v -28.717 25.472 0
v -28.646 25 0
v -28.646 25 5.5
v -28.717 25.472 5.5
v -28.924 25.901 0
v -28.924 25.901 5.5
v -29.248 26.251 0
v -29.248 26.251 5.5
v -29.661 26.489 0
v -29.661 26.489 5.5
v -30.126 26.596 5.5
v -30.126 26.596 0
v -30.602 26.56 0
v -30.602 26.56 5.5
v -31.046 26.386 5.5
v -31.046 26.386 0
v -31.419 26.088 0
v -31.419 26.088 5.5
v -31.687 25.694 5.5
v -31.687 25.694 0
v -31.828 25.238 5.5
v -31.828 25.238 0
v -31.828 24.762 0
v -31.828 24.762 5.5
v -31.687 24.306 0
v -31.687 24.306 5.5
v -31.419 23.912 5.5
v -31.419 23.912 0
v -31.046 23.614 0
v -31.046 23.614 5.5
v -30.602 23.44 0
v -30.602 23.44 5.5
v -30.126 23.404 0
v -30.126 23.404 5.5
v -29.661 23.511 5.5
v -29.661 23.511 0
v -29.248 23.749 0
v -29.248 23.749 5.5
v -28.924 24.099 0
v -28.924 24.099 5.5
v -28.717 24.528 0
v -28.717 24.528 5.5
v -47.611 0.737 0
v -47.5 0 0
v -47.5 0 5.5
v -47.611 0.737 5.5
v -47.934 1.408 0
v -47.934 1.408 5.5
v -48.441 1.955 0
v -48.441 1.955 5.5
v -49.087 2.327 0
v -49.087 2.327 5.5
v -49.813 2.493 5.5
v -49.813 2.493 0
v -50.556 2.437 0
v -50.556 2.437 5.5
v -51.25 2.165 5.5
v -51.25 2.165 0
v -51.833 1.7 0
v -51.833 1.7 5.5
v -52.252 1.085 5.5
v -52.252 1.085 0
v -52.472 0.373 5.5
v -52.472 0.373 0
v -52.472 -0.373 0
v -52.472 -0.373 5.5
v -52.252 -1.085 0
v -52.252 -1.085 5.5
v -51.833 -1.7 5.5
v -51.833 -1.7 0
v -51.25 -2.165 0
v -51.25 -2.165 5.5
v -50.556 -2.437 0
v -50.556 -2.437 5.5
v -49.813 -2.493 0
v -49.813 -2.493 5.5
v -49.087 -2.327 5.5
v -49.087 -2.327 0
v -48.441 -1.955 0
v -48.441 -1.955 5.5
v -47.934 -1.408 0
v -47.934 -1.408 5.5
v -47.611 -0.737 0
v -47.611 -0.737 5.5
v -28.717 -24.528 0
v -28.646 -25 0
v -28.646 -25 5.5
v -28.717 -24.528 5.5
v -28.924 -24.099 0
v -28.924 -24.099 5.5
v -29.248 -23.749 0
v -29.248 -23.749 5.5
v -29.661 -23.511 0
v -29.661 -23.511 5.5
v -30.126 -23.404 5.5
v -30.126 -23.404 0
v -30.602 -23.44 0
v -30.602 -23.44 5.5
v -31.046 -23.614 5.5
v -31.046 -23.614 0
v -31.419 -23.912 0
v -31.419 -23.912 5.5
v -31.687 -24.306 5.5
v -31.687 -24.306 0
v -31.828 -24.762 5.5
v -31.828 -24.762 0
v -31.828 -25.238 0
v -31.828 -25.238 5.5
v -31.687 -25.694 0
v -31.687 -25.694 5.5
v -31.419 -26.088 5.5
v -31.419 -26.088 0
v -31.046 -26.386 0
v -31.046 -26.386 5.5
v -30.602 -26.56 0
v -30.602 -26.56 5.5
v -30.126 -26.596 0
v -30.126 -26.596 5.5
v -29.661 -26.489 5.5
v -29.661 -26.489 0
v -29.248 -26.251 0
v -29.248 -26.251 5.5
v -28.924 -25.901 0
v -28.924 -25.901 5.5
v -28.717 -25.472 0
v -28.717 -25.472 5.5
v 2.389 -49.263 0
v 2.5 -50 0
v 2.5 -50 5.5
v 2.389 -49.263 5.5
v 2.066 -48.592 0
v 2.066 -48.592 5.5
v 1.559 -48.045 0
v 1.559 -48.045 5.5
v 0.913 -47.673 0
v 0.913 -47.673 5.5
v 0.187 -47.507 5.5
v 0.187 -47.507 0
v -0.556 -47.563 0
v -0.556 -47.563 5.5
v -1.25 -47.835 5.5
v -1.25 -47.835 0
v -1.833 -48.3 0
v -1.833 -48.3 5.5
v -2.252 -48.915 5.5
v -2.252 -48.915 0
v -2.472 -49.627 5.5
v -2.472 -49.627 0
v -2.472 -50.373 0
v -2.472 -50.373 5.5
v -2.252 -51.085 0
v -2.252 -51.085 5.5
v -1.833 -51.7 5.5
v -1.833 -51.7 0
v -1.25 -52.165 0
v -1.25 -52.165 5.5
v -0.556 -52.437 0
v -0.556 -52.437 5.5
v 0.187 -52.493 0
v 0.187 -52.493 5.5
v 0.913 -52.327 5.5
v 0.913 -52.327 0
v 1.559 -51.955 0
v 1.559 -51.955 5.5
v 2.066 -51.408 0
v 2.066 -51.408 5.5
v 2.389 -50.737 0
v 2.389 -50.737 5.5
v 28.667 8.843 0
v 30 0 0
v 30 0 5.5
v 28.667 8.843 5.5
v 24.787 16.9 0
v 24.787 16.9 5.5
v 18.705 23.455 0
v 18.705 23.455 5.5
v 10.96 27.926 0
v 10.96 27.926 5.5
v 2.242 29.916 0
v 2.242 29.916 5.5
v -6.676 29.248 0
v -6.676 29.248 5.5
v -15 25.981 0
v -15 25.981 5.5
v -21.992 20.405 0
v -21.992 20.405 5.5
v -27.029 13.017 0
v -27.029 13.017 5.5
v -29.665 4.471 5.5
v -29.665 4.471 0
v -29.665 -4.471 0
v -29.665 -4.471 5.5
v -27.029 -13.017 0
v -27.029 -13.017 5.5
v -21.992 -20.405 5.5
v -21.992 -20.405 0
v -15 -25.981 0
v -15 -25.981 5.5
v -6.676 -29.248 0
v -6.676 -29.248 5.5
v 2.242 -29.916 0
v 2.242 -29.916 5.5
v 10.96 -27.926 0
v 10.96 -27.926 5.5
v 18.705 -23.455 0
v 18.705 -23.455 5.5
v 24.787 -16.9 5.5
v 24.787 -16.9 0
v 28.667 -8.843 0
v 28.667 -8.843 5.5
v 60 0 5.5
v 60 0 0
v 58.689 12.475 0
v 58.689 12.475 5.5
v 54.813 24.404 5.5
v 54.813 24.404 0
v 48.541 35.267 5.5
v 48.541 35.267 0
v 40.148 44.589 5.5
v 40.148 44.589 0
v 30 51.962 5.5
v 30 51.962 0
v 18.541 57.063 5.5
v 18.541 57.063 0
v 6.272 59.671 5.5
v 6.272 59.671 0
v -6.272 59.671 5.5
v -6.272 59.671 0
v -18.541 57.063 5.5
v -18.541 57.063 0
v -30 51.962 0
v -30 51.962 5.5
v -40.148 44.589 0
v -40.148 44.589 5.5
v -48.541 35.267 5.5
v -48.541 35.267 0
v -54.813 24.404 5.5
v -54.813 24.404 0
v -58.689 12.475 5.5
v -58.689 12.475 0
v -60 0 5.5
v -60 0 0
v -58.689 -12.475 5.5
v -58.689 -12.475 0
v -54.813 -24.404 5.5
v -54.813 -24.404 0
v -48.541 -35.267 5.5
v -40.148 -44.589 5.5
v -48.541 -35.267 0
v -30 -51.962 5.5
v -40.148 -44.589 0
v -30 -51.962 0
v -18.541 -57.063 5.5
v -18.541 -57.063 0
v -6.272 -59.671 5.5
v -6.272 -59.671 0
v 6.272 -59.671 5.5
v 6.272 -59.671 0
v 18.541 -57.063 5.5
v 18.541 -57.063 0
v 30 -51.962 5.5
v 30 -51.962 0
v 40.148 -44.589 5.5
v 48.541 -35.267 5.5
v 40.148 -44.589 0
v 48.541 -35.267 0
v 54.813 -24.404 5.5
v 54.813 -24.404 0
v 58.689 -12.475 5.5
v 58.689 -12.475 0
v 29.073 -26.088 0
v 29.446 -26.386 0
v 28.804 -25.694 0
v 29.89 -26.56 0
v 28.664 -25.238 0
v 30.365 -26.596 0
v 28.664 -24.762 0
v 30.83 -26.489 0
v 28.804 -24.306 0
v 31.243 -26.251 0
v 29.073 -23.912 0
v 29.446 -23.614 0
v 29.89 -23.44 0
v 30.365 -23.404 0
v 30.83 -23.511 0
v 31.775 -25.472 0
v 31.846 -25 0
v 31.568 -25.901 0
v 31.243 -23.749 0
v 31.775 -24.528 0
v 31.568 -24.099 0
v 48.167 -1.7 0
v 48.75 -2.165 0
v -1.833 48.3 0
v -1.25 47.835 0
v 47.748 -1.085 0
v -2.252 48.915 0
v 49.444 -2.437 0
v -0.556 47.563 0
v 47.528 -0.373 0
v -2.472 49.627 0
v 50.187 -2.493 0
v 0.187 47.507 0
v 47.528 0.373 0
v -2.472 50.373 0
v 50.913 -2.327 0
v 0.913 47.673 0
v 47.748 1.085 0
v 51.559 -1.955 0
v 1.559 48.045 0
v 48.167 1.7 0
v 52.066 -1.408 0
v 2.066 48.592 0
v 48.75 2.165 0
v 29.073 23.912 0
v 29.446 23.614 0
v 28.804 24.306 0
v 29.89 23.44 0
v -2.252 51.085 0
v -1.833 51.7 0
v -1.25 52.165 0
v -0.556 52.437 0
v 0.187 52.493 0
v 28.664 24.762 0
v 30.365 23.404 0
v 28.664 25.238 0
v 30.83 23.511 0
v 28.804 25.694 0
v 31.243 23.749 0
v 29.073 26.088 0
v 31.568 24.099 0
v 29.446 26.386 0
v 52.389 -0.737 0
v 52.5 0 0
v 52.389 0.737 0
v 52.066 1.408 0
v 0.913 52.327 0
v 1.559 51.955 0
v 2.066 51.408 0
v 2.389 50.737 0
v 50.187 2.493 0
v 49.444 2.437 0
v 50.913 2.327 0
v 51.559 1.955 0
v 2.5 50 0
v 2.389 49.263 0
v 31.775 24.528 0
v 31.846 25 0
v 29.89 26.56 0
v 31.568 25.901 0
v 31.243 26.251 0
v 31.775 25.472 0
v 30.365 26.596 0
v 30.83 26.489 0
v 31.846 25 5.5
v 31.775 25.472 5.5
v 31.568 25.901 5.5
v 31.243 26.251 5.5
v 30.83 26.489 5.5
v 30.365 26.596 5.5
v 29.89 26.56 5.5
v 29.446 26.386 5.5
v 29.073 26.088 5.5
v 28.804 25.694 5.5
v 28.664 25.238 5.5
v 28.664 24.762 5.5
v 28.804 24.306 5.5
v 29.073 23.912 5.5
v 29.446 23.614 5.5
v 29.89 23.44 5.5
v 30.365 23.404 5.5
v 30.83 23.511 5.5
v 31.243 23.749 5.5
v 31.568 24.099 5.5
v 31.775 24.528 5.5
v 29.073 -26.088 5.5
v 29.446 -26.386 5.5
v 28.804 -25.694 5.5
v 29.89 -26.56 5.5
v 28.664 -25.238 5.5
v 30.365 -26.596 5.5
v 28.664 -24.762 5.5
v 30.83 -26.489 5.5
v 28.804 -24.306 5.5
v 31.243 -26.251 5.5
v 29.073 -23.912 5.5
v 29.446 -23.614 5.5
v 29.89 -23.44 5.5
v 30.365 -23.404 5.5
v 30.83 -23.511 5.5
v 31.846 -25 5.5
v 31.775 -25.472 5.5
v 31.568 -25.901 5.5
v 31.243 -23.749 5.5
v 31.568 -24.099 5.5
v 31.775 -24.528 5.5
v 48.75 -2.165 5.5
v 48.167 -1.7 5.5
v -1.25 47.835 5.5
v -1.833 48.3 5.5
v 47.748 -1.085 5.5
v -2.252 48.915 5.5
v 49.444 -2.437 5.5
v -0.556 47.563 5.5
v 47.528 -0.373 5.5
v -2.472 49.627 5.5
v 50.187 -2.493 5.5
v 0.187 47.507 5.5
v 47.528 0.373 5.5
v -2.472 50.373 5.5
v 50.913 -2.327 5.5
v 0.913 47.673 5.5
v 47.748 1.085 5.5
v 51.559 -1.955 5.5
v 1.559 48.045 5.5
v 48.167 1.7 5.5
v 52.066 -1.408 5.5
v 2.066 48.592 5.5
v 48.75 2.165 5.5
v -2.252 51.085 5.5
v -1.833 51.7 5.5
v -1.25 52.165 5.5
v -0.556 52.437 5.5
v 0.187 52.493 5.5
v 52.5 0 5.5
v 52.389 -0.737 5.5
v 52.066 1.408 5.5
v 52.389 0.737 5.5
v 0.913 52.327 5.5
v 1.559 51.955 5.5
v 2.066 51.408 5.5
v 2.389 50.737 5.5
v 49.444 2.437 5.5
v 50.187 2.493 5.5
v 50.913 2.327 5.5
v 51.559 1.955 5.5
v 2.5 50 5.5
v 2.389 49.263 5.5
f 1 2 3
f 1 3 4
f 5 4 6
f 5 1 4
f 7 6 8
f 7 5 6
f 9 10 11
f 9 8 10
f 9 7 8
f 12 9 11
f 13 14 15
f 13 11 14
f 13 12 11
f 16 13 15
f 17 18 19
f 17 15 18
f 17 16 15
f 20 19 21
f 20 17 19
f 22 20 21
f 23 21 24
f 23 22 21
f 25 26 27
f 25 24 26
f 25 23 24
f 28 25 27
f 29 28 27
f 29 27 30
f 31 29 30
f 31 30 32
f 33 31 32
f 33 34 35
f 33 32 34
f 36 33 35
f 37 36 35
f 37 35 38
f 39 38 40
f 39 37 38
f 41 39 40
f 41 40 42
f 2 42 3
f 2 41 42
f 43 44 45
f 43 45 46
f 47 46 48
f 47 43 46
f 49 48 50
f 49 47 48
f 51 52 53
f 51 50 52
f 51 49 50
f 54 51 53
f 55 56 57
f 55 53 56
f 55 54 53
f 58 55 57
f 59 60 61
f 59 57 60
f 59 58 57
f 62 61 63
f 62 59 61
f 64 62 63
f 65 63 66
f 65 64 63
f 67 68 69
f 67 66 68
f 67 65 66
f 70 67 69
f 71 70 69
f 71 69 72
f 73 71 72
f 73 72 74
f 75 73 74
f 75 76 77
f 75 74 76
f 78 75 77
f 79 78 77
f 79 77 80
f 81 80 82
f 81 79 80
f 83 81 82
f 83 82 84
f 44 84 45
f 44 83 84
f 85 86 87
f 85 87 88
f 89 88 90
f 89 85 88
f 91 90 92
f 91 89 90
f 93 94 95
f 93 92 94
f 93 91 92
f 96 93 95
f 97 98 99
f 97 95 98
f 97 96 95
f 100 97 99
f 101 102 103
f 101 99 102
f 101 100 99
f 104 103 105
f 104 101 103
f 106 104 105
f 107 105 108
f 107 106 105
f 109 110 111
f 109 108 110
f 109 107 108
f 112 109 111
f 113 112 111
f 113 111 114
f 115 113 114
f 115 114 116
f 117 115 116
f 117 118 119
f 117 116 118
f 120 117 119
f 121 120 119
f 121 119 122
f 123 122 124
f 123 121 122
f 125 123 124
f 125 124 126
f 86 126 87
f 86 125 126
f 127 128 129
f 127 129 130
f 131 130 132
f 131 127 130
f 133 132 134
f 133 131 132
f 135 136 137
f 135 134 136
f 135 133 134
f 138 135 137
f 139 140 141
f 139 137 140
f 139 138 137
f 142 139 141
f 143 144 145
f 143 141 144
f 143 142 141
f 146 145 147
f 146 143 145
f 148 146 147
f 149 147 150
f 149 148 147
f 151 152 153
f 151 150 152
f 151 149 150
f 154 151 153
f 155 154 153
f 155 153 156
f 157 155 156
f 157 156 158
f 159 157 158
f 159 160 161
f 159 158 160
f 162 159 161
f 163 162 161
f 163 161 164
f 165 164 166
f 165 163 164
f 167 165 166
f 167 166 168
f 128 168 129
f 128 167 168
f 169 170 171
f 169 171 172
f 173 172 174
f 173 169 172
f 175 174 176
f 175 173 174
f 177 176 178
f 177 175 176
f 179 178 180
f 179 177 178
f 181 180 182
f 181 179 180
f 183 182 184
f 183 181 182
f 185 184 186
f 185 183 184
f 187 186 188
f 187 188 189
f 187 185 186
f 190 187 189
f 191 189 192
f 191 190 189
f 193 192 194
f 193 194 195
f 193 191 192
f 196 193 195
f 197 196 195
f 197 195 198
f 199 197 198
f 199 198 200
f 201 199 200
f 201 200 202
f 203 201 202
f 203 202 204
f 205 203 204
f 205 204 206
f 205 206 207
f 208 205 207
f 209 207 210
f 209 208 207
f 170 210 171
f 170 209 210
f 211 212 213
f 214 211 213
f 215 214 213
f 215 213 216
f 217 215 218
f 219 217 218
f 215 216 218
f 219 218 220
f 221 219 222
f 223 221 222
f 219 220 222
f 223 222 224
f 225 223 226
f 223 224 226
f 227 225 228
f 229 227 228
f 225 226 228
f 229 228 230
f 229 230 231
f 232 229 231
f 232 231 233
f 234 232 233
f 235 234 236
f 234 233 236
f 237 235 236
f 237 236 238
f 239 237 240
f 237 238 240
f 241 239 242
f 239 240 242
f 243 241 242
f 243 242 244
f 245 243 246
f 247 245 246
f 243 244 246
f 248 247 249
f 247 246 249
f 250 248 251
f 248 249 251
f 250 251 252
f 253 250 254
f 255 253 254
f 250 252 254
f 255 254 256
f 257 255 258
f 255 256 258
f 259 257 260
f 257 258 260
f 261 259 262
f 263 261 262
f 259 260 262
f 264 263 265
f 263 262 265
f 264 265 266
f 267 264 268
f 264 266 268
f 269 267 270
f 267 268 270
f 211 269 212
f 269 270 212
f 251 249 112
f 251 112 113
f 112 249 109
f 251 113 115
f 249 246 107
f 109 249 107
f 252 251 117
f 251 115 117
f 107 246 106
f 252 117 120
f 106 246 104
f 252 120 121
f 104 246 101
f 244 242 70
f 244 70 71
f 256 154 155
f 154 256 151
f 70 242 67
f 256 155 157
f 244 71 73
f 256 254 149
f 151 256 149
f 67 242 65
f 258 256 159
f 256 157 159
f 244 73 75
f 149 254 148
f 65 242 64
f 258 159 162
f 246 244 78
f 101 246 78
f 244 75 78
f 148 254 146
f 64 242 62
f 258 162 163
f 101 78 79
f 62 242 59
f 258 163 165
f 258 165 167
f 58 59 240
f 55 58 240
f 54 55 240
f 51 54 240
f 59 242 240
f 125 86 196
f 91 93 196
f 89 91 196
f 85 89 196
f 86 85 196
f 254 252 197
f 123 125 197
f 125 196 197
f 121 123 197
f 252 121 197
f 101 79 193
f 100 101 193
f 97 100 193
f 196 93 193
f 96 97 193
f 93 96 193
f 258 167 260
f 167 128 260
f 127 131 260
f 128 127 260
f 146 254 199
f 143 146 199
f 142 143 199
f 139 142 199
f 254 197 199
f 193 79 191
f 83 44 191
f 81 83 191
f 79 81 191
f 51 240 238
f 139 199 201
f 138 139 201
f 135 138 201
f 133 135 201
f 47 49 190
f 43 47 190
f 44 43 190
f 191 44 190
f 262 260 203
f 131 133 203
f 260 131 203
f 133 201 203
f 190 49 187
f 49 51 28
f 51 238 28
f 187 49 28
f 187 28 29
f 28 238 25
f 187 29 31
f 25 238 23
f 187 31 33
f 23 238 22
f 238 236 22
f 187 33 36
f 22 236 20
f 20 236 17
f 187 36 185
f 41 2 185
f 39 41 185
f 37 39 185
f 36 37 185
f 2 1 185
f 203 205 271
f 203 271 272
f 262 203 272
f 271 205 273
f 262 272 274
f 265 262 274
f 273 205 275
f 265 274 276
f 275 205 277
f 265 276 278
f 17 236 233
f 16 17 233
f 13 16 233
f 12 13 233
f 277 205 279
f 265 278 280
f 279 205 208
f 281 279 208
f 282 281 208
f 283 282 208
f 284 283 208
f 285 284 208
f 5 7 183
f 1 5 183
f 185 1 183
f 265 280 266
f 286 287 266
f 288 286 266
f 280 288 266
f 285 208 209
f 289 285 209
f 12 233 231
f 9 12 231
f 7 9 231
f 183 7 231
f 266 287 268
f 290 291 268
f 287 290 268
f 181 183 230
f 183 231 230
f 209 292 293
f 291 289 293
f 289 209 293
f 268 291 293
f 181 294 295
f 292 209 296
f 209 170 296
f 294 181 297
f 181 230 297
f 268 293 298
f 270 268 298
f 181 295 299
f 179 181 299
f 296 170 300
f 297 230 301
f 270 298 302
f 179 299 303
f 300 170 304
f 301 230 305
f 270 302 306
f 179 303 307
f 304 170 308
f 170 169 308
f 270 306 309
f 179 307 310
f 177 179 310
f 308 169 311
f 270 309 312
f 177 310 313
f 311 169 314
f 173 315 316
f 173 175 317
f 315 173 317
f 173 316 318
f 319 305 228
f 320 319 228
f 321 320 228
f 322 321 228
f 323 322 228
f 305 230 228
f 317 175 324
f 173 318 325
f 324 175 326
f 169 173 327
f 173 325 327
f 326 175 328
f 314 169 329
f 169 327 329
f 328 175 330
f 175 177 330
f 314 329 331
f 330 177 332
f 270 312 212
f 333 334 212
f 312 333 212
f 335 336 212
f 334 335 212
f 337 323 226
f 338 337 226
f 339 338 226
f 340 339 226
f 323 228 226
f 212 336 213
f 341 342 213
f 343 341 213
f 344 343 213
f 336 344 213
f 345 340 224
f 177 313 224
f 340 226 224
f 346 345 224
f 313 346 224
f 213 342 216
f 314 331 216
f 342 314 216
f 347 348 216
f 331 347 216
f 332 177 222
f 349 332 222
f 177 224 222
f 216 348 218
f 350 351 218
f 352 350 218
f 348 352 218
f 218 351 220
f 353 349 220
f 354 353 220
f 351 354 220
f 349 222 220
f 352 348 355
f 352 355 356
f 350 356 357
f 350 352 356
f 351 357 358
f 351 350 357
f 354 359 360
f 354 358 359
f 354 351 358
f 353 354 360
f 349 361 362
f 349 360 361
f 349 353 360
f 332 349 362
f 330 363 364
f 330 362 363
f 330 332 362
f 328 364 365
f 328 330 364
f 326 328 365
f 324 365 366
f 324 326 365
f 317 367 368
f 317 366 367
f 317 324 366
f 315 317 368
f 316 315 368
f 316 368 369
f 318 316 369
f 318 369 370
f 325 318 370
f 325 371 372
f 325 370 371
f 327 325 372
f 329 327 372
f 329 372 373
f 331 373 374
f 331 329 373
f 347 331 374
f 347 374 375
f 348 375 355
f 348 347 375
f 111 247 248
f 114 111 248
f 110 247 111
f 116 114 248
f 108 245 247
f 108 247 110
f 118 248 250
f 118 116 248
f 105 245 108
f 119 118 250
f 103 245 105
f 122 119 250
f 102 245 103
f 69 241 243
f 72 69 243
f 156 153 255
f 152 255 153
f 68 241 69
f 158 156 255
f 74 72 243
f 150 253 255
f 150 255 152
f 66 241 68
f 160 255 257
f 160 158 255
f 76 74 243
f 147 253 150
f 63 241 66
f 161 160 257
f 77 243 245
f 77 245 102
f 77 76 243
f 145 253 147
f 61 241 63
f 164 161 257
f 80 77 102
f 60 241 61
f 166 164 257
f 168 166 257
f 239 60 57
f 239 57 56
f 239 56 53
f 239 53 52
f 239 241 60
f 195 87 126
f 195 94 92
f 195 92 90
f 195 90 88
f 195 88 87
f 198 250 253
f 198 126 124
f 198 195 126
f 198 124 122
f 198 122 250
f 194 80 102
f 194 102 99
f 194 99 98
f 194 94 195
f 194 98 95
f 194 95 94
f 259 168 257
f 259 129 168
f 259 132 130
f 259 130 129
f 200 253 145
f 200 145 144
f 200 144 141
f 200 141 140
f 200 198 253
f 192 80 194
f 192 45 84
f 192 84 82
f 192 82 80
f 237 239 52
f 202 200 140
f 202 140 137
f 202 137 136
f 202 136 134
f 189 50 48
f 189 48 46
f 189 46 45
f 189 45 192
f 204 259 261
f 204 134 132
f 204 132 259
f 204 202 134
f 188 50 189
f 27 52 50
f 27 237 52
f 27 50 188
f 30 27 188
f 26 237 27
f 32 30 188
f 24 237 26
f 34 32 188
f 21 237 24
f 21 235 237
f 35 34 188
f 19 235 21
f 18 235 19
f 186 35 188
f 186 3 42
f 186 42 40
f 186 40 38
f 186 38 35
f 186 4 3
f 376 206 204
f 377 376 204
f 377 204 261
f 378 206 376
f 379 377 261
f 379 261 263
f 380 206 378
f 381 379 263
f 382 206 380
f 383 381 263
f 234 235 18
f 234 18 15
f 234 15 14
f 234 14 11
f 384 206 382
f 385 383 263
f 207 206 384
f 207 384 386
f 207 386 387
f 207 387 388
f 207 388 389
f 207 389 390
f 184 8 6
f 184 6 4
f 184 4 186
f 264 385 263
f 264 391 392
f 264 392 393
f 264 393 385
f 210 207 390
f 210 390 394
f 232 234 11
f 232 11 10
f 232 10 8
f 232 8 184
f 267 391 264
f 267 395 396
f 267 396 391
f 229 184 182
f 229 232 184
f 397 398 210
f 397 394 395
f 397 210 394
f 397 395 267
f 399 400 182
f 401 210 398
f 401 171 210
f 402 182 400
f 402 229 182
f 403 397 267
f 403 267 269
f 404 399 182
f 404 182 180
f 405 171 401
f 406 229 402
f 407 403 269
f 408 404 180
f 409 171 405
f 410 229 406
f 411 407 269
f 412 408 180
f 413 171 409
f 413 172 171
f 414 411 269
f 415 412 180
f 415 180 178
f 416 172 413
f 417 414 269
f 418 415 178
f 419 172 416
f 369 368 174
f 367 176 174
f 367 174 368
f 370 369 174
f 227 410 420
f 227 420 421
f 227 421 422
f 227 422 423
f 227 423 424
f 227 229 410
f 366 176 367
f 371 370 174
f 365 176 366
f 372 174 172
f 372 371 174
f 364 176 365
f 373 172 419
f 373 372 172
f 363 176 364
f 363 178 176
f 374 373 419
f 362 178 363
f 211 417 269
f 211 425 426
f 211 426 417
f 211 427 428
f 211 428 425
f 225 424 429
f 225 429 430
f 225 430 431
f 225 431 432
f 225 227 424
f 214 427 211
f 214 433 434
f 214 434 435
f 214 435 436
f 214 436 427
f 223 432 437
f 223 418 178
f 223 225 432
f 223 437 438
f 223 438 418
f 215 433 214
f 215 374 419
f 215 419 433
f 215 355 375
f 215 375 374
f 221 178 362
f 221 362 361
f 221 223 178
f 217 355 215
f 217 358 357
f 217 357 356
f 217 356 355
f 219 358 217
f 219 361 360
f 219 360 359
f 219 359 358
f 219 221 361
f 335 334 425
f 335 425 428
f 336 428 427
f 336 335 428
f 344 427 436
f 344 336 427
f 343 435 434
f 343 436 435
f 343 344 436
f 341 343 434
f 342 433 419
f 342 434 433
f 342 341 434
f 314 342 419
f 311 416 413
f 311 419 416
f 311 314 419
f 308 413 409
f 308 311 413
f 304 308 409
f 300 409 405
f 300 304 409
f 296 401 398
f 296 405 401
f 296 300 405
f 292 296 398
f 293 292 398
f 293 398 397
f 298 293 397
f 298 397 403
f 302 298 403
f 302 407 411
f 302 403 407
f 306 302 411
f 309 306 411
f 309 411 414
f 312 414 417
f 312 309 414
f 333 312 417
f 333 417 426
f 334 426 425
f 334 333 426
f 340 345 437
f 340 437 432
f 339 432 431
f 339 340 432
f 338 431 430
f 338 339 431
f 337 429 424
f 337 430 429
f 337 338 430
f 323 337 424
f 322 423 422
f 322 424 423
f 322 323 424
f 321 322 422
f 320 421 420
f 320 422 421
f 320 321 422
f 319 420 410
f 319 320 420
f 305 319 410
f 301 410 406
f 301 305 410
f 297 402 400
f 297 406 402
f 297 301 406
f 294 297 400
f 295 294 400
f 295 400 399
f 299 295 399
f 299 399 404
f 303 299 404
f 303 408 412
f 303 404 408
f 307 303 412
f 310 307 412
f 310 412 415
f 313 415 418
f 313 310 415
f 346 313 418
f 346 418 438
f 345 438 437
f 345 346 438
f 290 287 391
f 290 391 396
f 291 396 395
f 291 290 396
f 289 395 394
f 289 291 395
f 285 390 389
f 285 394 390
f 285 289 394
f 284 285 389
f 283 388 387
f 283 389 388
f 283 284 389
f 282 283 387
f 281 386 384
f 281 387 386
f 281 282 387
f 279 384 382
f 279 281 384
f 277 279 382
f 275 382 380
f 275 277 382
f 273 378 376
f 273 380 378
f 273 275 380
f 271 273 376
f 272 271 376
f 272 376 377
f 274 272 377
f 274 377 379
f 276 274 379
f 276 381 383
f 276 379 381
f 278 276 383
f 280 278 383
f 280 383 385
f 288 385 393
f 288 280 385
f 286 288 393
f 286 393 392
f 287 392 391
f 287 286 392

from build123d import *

# Parameters (mm, degrees)
SKETCH_1_R               = 60
SKETCH_1_R_2             = 30
EXTRUDE_1_DEPTH          = 5.5
CUT_EXTRUDE_1_DEPTH      = 86.030876745
CUT_EXTRUDE_1_DEPTH_BACK = 86.030876745
SKETCH_2_R               = 2.5
CUT_EXTRUDE_3_DEPTH      = 86.030876745
CUT_EXTRUDE_3_DEPTH_BACK = 86.030876745
SKETCH_3_R               = 1.6


with BuildPart() as part:
    # ｽｹｯﾁ1 → ﾎﾞｽ - 押し出し1 (new body)
    with BuildSketch(Plane.XY):
        Circle(SKETCH_1_R)
        Circle(SKETCH_1_R_2, mode=Mode.SUBTRACT)
    extrude(amount=EXTRUDE_1_DEPTH)

    # ｽｹｯﾁ2 → ｶｯﾄ - 押し出し1 (cut, two sides: drawn at the far end of the back side and taken through both)
    with BuildSketch(Plane.XY.offset(5.5).offset(-CUT_EXTRUDE_1_DEPTH_BACK)):
        with Locations((0, -50)):
            Circle(SKETCH_2_R)
        with Locations((-50, 0)):
            Circle(SKETCH_2_R)
        with Locations((50, 0)):
            Circle(SKETCH_2_R)
        with Locations((0, 50)):
            Circle(SKETCH_2_R)
    extrude(amount=CUT_EXTRUDE_1_DEPTH + CUT_EXTRUDE_1_DEPTH_BACK, mode=Mode.SUBTRACT)

    # ｽｹｯﾁ3 → ｶｯﾄ - 押し出し3 (cut, two sides: drawn at the far end of the back side and taken through both)
    with BuildSketch(Plane.XY.offset(5.5).offset(-CUT_EXTRUDE_3_DEPTH_BACK)):
        with Locations((30.245839942, 25)):
            Circle(SKETCH_3_R)
        with Locations((-30.245839942, 25)):
            Circle(SKETCH_3_R)
        with Locations((-30.245839942, -25)):
            Circle(SKETCH_3_R)
        with Locations((30.245839942, -25)):
            Circle(SKETCH_3_R)
    extrude(amount=CUT_EXTRUDE_3_DEPTH + CUT_EXTRUDE_3_DEPTH_BACK, mode=Mode.SUBTRACT)


solid = part.part
